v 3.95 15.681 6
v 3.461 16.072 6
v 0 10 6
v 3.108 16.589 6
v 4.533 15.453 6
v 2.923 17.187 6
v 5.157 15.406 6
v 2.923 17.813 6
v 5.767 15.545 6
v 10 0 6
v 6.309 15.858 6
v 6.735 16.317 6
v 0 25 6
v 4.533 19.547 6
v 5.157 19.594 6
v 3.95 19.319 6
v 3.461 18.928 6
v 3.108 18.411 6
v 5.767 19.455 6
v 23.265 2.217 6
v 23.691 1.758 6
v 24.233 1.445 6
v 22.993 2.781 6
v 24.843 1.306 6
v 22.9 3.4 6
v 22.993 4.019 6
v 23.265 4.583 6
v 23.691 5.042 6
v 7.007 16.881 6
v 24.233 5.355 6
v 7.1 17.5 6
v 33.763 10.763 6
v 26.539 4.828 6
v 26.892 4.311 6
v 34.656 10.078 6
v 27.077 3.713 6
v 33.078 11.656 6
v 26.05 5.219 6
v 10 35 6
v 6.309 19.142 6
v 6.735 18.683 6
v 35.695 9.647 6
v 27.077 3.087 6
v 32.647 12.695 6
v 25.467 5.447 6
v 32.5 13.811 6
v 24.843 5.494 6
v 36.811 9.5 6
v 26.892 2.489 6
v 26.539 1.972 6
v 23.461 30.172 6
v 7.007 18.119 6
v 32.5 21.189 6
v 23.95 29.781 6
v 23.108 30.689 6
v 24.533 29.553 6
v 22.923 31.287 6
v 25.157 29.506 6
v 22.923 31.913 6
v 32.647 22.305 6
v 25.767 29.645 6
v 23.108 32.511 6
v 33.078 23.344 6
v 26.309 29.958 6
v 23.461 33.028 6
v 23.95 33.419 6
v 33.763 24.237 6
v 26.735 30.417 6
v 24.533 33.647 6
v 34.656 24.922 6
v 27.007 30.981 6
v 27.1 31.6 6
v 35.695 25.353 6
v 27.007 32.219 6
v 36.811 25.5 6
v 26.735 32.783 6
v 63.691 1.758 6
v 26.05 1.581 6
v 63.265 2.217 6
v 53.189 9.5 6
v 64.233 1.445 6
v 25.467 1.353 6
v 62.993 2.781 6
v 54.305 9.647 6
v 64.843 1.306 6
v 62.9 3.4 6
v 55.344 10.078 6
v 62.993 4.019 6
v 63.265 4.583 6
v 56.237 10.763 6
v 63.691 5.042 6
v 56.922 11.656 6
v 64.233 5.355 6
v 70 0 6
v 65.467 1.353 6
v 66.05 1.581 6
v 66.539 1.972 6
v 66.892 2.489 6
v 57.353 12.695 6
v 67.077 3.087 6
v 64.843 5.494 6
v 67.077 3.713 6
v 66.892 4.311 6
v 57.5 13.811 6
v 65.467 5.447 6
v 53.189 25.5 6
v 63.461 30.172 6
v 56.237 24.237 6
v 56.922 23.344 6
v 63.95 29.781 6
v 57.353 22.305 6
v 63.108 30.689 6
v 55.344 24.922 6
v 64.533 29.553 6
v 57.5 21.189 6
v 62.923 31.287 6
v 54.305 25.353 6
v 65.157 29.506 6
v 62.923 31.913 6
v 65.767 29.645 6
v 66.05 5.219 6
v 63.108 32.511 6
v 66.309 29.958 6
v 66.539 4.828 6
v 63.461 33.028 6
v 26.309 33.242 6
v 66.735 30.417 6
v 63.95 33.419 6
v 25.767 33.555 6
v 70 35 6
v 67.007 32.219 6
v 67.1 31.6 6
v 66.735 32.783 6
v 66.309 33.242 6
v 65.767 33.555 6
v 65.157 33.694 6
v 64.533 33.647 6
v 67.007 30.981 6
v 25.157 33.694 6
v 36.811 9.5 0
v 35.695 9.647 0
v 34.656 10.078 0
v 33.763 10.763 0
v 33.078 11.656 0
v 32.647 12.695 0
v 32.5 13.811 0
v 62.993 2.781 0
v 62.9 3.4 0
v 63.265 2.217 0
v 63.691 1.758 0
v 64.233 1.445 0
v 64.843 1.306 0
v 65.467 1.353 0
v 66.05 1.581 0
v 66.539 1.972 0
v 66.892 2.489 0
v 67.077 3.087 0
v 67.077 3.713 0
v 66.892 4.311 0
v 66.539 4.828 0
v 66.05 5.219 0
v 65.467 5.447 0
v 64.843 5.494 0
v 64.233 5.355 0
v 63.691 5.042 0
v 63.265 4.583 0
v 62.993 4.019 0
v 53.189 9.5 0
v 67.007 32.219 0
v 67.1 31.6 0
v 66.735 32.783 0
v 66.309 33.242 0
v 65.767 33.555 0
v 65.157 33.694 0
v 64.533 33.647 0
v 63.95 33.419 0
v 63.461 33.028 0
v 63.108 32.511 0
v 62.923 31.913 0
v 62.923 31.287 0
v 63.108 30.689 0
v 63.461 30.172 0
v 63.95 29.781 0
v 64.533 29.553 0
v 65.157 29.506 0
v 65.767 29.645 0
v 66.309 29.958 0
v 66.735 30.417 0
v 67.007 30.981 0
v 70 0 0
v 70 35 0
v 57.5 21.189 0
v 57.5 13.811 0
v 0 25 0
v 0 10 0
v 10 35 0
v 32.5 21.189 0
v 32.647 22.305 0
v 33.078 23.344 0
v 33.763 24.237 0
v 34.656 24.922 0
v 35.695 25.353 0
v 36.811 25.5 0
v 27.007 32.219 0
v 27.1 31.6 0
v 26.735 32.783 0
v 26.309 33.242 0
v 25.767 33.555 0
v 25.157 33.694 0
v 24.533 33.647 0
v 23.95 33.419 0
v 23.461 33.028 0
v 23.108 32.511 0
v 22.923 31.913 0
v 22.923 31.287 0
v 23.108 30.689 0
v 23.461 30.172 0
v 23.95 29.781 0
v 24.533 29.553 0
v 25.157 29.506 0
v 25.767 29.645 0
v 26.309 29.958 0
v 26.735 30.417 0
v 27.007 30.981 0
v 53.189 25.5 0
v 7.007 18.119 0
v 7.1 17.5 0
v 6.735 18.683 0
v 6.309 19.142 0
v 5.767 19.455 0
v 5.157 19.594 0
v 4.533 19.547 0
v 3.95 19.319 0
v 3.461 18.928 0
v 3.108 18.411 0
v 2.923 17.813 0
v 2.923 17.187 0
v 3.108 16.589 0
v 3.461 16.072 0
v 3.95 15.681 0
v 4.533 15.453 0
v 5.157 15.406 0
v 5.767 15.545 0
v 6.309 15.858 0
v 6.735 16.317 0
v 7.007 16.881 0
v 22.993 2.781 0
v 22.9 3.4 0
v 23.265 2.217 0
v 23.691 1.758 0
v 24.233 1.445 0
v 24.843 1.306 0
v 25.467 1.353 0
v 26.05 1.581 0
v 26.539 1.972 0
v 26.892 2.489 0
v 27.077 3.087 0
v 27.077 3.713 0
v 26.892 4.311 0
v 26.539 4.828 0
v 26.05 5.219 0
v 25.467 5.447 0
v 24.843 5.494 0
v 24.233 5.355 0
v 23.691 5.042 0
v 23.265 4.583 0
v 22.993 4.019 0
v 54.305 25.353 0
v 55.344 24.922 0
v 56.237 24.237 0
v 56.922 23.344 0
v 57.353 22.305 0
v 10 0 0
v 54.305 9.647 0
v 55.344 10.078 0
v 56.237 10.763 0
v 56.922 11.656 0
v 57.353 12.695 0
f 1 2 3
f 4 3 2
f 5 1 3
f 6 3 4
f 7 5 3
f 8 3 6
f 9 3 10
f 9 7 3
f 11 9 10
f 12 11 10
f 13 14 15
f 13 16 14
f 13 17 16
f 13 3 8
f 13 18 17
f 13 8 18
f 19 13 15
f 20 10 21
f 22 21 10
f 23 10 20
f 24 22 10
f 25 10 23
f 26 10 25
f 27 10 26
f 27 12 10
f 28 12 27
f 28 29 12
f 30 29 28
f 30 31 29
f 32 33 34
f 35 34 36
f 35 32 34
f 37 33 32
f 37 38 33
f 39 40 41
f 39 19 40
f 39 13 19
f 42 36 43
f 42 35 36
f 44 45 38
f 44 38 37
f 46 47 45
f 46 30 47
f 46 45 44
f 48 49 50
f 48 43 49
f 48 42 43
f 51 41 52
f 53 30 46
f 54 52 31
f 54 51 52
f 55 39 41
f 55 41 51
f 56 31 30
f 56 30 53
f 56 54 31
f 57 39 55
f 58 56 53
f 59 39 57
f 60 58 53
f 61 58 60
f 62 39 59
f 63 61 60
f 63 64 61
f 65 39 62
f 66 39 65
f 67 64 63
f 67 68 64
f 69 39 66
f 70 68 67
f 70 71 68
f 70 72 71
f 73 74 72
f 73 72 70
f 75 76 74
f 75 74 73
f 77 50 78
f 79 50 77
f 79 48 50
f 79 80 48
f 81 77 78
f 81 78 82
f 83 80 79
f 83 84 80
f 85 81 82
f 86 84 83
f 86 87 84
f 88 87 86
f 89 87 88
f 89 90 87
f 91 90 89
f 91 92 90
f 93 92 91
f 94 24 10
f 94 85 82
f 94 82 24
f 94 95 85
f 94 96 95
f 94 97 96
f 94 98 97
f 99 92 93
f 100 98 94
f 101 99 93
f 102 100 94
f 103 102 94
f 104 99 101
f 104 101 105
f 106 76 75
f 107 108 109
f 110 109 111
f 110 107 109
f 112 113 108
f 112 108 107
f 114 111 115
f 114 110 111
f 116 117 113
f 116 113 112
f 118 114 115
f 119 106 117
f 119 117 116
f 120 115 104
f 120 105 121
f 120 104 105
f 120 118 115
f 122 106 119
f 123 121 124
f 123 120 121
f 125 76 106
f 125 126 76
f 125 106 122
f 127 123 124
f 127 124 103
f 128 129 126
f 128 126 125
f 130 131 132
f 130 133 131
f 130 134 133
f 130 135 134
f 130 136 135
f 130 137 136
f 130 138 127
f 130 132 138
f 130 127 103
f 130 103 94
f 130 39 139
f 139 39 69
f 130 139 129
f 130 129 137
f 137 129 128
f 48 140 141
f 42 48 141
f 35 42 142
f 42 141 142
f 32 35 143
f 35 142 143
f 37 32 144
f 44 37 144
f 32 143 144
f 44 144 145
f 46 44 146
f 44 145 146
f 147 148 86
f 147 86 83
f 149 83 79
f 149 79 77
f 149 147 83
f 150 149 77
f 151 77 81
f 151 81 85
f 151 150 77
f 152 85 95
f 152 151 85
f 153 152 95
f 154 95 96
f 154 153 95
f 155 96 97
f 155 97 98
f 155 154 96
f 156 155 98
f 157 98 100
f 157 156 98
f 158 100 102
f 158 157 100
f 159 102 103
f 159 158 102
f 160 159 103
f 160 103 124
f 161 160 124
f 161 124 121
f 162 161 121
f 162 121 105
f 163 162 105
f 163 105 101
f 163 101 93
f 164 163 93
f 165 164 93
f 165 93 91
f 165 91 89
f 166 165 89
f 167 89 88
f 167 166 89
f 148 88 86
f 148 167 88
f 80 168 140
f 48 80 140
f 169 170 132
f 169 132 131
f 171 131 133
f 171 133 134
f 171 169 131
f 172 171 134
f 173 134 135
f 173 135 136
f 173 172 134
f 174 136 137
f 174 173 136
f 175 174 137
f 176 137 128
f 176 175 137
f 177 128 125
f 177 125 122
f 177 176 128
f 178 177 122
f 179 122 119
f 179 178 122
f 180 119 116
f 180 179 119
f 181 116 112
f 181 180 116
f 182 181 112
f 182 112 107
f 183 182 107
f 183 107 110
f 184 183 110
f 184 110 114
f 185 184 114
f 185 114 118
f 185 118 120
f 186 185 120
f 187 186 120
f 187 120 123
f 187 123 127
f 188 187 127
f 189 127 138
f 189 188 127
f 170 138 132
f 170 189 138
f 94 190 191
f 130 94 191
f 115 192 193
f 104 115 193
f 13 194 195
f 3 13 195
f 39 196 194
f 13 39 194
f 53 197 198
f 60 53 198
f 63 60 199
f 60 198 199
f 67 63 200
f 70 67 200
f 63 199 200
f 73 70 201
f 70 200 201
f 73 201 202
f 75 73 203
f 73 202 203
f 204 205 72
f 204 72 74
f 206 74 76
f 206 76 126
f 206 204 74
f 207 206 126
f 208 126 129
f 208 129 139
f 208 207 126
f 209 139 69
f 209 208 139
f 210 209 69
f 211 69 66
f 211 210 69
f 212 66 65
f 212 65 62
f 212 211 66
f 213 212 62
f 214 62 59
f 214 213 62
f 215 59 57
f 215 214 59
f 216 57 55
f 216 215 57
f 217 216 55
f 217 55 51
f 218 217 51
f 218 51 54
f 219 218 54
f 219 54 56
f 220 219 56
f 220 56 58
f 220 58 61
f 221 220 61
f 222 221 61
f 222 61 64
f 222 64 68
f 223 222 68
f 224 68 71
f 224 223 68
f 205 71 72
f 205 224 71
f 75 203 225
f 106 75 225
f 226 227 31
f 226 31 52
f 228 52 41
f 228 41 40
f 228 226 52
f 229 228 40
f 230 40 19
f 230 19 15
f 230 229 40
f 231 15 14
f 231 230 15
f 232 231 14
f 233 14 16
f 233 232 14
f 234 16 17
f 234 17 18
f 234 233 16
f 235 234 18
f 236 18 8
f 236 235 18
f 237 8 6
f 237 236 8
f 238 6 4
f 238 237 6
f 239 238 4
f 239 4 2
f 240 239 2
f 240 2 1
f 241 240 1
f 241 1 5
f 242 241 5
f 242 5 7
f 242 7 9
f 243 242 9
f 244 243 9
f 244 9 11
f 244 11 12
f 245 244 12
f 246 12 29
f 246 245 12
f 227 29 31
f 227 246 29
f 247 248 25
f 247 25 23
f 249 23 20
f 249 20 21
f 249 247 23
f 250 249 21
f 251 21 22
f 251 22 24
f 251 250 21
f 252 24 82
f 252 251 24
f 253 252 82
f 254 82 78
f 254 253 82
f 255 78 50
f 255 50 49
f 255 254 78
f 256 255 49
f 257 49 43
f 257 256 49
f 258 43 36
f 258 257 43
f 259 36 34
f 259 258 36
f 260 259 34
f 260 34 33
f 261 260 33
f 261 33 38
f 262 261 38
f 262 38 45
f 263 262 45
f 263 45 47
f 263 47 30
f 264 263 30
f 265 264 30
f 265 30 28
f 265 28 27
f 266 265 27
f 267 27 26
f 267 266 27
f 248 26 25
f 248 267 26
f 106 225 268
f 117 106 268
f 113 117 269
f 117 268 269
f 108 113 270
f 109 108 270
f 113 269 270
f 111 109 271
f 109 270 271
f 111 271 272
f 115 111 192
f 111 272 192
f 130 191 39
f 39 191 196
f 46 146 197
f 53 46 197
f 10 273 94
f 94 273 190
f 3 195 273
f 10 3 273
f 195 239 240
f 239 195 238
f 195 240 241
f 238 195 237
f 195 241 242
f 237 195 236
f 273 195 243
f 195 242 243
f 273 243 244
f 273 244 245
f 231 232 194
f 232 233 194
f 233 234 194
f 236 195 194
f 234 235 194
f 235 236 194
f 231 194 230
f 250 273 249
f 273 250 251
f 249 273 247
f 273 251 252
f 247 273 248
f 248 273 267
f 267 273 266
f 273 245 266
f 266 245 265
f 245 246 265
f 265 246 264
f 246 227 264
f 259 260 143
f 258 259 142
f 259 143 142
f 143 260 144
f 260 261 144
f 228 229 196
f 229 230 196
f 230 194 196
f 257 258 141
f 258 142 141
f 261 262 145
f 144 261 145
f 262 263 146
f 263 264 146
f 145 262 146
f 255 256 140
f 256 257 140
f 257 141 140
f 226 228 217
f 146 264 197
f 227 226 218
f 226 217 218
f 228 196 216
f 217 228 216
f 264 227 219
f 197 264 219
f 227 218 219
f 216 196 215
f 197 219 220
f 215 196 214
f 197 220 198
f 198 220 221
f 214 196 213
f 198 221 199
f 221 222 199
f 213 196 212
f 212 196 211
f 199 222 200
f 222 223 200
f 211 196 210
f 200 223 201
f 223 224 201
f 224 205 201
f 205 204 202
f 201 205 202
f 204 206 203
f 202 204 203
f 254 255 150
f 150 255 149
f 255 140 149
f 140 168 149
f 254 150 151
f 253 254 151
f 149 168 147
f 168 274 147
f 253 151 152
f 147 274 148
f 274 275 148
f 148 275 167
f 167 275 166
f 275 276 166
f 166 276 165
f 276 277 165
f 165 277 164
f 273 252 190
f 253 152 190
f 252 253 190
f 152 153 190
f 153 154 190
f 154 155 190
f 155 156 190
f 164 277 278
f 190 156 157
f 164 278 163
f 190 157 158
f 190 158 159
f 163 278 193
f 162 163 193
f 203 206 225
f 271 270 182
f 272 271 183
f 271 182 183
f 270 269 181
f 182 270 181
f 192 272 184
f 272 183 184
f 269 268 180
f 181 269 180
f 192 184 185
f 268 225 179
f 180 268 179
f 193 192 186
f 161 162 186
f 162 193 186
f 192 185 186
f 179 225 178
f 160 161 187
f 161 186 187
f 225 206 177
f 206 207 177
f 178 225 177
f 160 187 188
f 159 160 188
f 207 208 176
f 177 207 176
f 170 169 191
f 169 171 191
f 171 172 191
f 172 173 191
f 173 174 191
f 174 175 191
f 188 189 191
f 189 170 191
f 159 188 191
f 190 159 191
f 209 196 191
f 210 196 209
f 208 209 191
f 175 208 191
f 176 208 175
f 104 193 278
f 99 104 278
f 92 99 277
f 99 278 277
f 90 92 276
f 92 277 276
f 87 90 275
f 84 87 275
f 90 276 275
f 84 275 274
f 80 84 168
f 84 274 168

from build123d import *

# Parameters (mm, degrees)
SZKIC1_R                    = 2.1
DODANIE_WYCI_GNI_CIE1_DEPTH = 6


with BuildPart() as part:
    # Szkic1 → Dodanie-wyciągnięcie1 (new body)
    with BuildSketch(Plane.XY):
        Polygon((10, 0), (70, 0), (70, 35), (10, 35), (0, 25), (0, 10), align=None)
        with Locations((65, 31.6)):
            Circle(SZKIC1_R, mode=Mode.SUBTRACT)
        with Locations((25, 31.6)):
            Circle(SZKIC1_R, mode=Mode.SUBTRACT)
        with Locations(Location((65, 3.4, 0), (0, 0, 180))):
            Circle(SZKIC1_R, mode=Mode.SUBTRACT)
        with Locations(Location((25, 3.4, 0), (0, 0, 180))):
            Circle(SZKIC1_R, mode=Mode.SUBTRACT)
        with Locations((5, 17.5)):
            Circle(SZKIC1_R, mode=Mode.SUBTRACT)
        with BuildLine():
            Line((53.188946254, 9.5), (36.811053746, 9.5))
            ThreePointArc((36.811053746, 9.5), (33.762678408, 10.762678408), (32.5, 13.811053746))
            Line((32.5, 13.811053746), (32.5, 21.188946254))
            ThreePointArc((32.5, 21.188946254), (33.762678408, 24.237321592), (36.811053746, 25.5))
            Line((36.811053746, 25.5), (53.188946254, 25.5))
            ThreePointArc((53.188946254, 25.5), (56.237321592, 24.237321592), (57.5, 21.188946254))
            Line((57.5, 21.188946254), (57.5, 13.811053746))
            ThreePointArc((57.5, 13.811053746), (56.237321592, 10.762678408), (53.188946254, 9.5))
        make_face(mode=Mode.SUBTRACT)
    extrude(amount=DODANIE_WYCI_GNI_CIE1_DEPTH)


solid = part.part
